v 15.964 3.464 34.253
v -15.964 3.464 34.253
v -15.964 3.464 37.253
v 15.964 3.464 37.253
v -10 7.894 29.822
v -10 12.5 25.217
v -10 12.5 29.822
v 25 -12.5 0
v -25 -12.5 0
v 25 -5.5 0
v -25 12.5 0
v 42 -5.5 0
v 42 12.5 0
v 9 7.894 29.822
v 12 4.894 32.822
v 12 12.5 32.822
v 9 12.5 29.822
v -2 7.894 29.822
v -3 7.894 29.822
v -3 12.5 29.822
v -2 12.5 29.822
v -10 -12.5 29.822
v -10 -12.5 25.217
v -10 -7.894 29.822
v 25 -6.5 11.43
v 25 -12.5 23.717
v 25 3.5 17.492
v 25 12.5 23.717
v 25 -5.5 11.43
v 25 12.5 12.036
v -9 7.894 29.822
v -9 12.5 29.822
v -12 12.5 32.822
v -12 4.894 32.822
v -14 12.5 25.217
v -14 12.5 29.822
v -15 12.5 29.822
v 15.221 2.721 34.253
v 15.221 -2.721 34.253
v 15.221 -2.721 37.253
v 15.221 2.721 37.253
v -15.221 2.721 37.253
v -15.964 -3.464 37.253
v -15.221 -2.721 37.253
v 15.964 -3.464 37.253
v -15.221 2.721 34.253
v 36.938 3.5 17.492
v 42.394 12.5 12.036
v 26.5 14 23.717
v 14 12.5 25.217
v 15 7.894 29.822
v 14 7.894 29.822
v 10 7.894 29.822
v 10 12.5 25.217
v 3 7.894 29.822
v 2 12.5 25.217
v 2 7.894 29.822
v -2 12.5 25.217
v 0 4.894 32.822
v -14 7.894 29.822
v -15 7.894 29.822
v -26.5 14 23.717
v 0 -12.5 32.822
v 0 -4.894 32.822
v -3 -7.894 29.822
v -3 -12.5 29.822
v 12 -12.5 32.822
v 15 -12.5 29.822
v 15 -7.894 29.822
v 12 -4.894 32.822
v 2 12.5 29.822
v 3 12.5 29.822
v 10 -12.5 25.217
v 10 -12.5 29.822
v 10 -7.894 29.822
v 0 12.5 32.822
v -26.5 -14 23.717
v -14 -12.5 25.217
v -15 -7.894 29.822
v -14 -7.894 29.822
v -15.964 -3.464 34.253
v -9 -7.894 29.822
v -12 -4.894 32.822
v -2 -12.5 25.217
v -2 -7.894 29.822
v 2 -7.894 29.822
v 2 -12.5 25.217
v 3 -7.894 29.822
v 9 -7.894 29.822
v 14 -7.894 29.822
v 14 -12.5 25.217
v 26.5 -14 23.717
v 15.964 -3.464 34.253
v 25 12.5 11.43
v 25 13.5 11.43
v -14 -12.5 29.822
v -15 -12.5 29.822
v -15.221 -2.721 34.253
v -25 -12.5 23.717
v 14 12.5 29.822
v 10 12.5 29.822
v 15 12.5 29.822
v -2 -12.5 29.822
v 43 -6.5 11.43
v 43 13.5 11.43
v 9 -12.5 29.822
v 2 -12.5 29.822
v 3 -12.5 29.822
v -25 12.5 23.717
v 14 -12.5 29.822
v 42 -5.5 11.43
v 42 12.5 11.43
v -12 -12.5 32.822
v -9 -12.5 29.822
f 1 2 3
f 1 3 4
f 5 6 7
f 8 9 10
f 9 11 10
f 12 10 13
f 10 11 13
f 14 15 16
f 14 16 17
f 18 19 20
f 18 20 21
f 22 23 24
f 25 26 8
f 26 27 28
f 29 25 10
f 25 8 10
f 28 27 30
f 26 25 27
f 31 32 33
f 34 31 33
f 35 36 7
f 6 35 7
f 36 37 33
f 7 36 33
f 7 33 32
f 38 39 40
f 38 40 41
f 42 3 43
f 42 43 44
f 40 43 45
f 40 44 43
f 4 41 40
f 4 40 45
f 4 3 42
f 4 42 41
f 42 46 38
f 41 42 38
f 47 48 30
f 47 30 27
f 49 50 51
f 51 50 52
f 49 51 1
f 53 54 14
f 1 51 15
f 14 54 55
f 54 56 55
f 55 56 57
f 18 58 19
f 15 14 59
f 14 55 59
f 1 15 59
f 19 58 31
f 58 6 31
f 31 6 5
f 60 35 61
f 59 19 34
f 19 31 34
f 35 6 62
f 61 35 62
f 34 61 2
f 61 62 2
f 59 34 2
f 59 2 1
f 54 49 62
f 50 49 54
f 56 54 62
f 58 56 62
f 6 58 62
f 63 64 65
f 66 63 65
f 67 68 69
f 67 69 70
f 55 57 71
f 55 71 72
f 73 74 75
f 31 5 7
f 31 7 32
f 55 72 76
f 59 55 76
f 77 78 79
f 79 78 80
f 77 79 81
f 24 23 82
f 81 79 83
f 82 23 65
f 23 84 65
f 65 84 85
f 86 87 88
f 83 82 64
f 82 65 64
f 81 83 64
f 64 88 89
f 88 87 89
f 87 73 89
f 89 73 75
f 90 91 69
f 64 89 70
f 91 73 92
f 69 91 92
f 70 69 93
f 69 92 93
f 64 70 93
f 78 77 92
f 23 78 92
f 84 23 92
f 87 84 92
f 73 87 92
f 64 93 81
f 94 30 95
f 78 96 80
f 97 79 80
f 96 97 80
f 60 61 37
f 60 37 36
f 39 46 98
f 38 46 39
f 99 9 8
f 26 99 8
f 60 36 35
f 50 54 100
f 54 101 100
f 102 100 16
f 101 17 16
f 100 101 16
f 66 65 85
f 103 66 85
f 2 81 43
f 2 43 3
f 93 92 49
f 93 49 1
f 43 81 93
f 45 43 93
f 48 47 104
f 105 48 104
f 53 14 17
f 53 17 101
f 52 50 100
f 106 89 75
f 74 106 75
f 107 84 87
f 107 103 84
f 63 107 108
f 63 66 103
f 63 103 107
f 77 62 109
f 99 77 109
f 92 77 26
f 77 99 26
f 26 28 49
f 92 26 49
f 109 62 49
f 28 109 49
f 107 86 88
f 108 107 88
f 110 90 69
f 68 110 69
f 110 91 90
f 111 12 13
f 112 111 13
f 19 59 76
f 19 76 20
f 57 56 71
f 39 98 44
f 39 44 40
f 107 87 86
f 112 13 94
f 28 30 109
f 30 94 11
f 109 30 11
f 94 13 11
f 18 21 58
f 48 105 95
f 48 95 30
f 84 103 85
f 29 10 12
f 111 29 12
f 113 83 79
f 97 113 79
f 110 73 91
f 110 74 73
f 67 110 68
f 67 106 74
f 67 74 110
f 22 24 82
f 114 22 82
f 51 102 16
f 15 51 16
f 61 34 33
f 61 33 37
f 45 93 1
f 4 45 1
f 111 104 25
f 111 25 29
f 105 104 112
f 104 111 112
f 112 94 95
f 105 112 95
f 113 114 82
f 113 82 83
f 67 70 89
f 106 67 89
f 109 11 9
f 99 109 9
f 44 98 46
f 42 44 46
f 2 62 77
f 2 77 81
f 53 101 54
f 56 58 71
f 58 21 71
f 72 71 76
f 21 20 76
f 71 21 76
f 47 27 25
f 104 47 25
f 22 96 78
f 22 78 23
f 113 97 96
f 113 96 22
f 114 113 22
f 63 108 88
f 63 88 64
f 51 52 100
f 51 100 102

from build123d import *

# Parameters (mm, degrees)
F1_DEPTH       = 11.42979
F3_DEPTH       = 12.28684
F4_W           = 53
F4_H           = 28
F5_DEPTH       = 10.53635
F5_TAPER       = 45
F10_DEPTH      = 18
F12_DEPTH      = 19.501
F12_DEPTH_BACK = 8.501
F13_W          = 31.9273
F13_H          = 6.9273
F13_W_2        = 30.4412200116
F13_H_2        = 5.4412200116
F14_DEPTH      = 3


with BuildPart() as f1:
    # F0 (on Top) → F1 (new body)
    with BuildSketch(Plane.XY):
        Polygon((-25, -12.5), (25, -12.5), (25, -5.5), (42, -5.5), (42, 12.5), (25, 12.5), (-25, 12.5), align=None)
    extrude(amount=F1_DEPTH)

    # F2 (on face) → F3 (join)
    with BuildSketch(Plane.XY.offset(11.42979)):
        Polygon((-25, -12.5), (25, -12.5), (25, -5.5), (25, 12.5), (-25, 12.5), align=None)
    extrude(amount=F3_DEPTH)

    # F4 (on face) → F5 (join)
    with BuildSketch(Plane.XY.offset(23.71663)):
        Rectangle(F4_W, F4_H)
    extrude(amount=F5_DEPTH, taper=F5_TAPER)


with BuildPart() as f7:
    # F6 (on face) → F7 (new body, up to the next surface of F1)
    with BuildSketch(Plane.XZ.offset(12.5)):
        Polygon((-12, 32.8224519938), (-15, 29.8224519938), (-14, 29.8224519938), (-14, 25.21663), (-12, 25.21663), (-10, 25.21663), (-10, 29.8224519938), (-9, 29.8224519938), align=None)
    extrude(until=Until.NEXT, target=f1.part, dir=(0, 1, 0))


with BuildPart() as f7b:
    # F6 (on face) → F7, piece 2 (new body, up to the next surface of F1)
    with BuildSketch(Plane.XZ.offset(12.5)):
        Polygon((-2, 25.21663), (0, 25.21663), (2, 25.21663), (2, 29.8224519938), (3, 29.8224519938), (0, 32.8224519938), (-3, 29.8224519938), (-2, 29.8224519938), align=None)
    extrude(until=Until.NEXT, target=f1.part, dir=(0, 1, 0))


with BuildPart() as f7c:
    # F6 (on face) → F7, piece 3 (new body, up to the next surface of F1)
    with BuildSketch(Plane.XZ.offset(12.5)):
        Polygon((10, 25.21663), (12, 25.21663), (14, 25.21663), (14, 29.8224519938), (15, 29.8224519938), (12, 32.8224519938), (9, 29.8224519938), (10, 29.8224519938), align=None)
    extrude(until=Until.NEXT, target=f1.part, dir=(0, 1, 0))


with BuildPart() as f1_1:
    add(f1.part)

    # F8: F7, F7b, F7c across plane
    add(f7.part.mirror(Plane.XZ))
    add(f7b.part.mirror(Plane.XZ))
    add(f7c.part.mirror(Plane.XZ))

    # F9 (on face) → F10 (join)
    with BuildSketch(Plane.YZ.offset(25)):
        Polygon((3.5, 17.4922389561), (-6.5, 11.42979), (-5.5, 11.42979), (12.5, 11.42979), (12.5, 12.0360348956), align=None)
        Polygon((12.5, 12.0360348956), (12.5, 11.42979), (13.5, 11.42979), align=None)
    extrude(amount=F10_DEPTH)

    # F11 (on face) → F12 (cut, two sides)
    with BuildSketch(Plane.XZ.offset(5.5)) as f12_sk:
        Polygon((43, 11.42979), (43, 17.4922389561), (36.9375510439, 17.4922389561), align=None)
    extrude(amount=-F12_DEPTH, mode=Mode.SUBTRACT)
    extrude(f12_sk.sketch, amount=F12_DEPTH_BACK, mode=Mode.SUBTRACT)

    add(f7.part)  # F14 merges F7

    add(f7b.part)  # F14 merges F7b

    add(f7c.part)  # F14 merges F7c
    # F13 (on face) → F14 (join)
    with BuildSketch(Plane.XY.offset(34.25298)):
        Rectangle(F13_W, F13_H)
        Rectangle(F13_W_2, F13_H_2, mode=Mode.SUBTRACT)
    extrude(amount=F14_DEPTH)


solid = f1_1.part
